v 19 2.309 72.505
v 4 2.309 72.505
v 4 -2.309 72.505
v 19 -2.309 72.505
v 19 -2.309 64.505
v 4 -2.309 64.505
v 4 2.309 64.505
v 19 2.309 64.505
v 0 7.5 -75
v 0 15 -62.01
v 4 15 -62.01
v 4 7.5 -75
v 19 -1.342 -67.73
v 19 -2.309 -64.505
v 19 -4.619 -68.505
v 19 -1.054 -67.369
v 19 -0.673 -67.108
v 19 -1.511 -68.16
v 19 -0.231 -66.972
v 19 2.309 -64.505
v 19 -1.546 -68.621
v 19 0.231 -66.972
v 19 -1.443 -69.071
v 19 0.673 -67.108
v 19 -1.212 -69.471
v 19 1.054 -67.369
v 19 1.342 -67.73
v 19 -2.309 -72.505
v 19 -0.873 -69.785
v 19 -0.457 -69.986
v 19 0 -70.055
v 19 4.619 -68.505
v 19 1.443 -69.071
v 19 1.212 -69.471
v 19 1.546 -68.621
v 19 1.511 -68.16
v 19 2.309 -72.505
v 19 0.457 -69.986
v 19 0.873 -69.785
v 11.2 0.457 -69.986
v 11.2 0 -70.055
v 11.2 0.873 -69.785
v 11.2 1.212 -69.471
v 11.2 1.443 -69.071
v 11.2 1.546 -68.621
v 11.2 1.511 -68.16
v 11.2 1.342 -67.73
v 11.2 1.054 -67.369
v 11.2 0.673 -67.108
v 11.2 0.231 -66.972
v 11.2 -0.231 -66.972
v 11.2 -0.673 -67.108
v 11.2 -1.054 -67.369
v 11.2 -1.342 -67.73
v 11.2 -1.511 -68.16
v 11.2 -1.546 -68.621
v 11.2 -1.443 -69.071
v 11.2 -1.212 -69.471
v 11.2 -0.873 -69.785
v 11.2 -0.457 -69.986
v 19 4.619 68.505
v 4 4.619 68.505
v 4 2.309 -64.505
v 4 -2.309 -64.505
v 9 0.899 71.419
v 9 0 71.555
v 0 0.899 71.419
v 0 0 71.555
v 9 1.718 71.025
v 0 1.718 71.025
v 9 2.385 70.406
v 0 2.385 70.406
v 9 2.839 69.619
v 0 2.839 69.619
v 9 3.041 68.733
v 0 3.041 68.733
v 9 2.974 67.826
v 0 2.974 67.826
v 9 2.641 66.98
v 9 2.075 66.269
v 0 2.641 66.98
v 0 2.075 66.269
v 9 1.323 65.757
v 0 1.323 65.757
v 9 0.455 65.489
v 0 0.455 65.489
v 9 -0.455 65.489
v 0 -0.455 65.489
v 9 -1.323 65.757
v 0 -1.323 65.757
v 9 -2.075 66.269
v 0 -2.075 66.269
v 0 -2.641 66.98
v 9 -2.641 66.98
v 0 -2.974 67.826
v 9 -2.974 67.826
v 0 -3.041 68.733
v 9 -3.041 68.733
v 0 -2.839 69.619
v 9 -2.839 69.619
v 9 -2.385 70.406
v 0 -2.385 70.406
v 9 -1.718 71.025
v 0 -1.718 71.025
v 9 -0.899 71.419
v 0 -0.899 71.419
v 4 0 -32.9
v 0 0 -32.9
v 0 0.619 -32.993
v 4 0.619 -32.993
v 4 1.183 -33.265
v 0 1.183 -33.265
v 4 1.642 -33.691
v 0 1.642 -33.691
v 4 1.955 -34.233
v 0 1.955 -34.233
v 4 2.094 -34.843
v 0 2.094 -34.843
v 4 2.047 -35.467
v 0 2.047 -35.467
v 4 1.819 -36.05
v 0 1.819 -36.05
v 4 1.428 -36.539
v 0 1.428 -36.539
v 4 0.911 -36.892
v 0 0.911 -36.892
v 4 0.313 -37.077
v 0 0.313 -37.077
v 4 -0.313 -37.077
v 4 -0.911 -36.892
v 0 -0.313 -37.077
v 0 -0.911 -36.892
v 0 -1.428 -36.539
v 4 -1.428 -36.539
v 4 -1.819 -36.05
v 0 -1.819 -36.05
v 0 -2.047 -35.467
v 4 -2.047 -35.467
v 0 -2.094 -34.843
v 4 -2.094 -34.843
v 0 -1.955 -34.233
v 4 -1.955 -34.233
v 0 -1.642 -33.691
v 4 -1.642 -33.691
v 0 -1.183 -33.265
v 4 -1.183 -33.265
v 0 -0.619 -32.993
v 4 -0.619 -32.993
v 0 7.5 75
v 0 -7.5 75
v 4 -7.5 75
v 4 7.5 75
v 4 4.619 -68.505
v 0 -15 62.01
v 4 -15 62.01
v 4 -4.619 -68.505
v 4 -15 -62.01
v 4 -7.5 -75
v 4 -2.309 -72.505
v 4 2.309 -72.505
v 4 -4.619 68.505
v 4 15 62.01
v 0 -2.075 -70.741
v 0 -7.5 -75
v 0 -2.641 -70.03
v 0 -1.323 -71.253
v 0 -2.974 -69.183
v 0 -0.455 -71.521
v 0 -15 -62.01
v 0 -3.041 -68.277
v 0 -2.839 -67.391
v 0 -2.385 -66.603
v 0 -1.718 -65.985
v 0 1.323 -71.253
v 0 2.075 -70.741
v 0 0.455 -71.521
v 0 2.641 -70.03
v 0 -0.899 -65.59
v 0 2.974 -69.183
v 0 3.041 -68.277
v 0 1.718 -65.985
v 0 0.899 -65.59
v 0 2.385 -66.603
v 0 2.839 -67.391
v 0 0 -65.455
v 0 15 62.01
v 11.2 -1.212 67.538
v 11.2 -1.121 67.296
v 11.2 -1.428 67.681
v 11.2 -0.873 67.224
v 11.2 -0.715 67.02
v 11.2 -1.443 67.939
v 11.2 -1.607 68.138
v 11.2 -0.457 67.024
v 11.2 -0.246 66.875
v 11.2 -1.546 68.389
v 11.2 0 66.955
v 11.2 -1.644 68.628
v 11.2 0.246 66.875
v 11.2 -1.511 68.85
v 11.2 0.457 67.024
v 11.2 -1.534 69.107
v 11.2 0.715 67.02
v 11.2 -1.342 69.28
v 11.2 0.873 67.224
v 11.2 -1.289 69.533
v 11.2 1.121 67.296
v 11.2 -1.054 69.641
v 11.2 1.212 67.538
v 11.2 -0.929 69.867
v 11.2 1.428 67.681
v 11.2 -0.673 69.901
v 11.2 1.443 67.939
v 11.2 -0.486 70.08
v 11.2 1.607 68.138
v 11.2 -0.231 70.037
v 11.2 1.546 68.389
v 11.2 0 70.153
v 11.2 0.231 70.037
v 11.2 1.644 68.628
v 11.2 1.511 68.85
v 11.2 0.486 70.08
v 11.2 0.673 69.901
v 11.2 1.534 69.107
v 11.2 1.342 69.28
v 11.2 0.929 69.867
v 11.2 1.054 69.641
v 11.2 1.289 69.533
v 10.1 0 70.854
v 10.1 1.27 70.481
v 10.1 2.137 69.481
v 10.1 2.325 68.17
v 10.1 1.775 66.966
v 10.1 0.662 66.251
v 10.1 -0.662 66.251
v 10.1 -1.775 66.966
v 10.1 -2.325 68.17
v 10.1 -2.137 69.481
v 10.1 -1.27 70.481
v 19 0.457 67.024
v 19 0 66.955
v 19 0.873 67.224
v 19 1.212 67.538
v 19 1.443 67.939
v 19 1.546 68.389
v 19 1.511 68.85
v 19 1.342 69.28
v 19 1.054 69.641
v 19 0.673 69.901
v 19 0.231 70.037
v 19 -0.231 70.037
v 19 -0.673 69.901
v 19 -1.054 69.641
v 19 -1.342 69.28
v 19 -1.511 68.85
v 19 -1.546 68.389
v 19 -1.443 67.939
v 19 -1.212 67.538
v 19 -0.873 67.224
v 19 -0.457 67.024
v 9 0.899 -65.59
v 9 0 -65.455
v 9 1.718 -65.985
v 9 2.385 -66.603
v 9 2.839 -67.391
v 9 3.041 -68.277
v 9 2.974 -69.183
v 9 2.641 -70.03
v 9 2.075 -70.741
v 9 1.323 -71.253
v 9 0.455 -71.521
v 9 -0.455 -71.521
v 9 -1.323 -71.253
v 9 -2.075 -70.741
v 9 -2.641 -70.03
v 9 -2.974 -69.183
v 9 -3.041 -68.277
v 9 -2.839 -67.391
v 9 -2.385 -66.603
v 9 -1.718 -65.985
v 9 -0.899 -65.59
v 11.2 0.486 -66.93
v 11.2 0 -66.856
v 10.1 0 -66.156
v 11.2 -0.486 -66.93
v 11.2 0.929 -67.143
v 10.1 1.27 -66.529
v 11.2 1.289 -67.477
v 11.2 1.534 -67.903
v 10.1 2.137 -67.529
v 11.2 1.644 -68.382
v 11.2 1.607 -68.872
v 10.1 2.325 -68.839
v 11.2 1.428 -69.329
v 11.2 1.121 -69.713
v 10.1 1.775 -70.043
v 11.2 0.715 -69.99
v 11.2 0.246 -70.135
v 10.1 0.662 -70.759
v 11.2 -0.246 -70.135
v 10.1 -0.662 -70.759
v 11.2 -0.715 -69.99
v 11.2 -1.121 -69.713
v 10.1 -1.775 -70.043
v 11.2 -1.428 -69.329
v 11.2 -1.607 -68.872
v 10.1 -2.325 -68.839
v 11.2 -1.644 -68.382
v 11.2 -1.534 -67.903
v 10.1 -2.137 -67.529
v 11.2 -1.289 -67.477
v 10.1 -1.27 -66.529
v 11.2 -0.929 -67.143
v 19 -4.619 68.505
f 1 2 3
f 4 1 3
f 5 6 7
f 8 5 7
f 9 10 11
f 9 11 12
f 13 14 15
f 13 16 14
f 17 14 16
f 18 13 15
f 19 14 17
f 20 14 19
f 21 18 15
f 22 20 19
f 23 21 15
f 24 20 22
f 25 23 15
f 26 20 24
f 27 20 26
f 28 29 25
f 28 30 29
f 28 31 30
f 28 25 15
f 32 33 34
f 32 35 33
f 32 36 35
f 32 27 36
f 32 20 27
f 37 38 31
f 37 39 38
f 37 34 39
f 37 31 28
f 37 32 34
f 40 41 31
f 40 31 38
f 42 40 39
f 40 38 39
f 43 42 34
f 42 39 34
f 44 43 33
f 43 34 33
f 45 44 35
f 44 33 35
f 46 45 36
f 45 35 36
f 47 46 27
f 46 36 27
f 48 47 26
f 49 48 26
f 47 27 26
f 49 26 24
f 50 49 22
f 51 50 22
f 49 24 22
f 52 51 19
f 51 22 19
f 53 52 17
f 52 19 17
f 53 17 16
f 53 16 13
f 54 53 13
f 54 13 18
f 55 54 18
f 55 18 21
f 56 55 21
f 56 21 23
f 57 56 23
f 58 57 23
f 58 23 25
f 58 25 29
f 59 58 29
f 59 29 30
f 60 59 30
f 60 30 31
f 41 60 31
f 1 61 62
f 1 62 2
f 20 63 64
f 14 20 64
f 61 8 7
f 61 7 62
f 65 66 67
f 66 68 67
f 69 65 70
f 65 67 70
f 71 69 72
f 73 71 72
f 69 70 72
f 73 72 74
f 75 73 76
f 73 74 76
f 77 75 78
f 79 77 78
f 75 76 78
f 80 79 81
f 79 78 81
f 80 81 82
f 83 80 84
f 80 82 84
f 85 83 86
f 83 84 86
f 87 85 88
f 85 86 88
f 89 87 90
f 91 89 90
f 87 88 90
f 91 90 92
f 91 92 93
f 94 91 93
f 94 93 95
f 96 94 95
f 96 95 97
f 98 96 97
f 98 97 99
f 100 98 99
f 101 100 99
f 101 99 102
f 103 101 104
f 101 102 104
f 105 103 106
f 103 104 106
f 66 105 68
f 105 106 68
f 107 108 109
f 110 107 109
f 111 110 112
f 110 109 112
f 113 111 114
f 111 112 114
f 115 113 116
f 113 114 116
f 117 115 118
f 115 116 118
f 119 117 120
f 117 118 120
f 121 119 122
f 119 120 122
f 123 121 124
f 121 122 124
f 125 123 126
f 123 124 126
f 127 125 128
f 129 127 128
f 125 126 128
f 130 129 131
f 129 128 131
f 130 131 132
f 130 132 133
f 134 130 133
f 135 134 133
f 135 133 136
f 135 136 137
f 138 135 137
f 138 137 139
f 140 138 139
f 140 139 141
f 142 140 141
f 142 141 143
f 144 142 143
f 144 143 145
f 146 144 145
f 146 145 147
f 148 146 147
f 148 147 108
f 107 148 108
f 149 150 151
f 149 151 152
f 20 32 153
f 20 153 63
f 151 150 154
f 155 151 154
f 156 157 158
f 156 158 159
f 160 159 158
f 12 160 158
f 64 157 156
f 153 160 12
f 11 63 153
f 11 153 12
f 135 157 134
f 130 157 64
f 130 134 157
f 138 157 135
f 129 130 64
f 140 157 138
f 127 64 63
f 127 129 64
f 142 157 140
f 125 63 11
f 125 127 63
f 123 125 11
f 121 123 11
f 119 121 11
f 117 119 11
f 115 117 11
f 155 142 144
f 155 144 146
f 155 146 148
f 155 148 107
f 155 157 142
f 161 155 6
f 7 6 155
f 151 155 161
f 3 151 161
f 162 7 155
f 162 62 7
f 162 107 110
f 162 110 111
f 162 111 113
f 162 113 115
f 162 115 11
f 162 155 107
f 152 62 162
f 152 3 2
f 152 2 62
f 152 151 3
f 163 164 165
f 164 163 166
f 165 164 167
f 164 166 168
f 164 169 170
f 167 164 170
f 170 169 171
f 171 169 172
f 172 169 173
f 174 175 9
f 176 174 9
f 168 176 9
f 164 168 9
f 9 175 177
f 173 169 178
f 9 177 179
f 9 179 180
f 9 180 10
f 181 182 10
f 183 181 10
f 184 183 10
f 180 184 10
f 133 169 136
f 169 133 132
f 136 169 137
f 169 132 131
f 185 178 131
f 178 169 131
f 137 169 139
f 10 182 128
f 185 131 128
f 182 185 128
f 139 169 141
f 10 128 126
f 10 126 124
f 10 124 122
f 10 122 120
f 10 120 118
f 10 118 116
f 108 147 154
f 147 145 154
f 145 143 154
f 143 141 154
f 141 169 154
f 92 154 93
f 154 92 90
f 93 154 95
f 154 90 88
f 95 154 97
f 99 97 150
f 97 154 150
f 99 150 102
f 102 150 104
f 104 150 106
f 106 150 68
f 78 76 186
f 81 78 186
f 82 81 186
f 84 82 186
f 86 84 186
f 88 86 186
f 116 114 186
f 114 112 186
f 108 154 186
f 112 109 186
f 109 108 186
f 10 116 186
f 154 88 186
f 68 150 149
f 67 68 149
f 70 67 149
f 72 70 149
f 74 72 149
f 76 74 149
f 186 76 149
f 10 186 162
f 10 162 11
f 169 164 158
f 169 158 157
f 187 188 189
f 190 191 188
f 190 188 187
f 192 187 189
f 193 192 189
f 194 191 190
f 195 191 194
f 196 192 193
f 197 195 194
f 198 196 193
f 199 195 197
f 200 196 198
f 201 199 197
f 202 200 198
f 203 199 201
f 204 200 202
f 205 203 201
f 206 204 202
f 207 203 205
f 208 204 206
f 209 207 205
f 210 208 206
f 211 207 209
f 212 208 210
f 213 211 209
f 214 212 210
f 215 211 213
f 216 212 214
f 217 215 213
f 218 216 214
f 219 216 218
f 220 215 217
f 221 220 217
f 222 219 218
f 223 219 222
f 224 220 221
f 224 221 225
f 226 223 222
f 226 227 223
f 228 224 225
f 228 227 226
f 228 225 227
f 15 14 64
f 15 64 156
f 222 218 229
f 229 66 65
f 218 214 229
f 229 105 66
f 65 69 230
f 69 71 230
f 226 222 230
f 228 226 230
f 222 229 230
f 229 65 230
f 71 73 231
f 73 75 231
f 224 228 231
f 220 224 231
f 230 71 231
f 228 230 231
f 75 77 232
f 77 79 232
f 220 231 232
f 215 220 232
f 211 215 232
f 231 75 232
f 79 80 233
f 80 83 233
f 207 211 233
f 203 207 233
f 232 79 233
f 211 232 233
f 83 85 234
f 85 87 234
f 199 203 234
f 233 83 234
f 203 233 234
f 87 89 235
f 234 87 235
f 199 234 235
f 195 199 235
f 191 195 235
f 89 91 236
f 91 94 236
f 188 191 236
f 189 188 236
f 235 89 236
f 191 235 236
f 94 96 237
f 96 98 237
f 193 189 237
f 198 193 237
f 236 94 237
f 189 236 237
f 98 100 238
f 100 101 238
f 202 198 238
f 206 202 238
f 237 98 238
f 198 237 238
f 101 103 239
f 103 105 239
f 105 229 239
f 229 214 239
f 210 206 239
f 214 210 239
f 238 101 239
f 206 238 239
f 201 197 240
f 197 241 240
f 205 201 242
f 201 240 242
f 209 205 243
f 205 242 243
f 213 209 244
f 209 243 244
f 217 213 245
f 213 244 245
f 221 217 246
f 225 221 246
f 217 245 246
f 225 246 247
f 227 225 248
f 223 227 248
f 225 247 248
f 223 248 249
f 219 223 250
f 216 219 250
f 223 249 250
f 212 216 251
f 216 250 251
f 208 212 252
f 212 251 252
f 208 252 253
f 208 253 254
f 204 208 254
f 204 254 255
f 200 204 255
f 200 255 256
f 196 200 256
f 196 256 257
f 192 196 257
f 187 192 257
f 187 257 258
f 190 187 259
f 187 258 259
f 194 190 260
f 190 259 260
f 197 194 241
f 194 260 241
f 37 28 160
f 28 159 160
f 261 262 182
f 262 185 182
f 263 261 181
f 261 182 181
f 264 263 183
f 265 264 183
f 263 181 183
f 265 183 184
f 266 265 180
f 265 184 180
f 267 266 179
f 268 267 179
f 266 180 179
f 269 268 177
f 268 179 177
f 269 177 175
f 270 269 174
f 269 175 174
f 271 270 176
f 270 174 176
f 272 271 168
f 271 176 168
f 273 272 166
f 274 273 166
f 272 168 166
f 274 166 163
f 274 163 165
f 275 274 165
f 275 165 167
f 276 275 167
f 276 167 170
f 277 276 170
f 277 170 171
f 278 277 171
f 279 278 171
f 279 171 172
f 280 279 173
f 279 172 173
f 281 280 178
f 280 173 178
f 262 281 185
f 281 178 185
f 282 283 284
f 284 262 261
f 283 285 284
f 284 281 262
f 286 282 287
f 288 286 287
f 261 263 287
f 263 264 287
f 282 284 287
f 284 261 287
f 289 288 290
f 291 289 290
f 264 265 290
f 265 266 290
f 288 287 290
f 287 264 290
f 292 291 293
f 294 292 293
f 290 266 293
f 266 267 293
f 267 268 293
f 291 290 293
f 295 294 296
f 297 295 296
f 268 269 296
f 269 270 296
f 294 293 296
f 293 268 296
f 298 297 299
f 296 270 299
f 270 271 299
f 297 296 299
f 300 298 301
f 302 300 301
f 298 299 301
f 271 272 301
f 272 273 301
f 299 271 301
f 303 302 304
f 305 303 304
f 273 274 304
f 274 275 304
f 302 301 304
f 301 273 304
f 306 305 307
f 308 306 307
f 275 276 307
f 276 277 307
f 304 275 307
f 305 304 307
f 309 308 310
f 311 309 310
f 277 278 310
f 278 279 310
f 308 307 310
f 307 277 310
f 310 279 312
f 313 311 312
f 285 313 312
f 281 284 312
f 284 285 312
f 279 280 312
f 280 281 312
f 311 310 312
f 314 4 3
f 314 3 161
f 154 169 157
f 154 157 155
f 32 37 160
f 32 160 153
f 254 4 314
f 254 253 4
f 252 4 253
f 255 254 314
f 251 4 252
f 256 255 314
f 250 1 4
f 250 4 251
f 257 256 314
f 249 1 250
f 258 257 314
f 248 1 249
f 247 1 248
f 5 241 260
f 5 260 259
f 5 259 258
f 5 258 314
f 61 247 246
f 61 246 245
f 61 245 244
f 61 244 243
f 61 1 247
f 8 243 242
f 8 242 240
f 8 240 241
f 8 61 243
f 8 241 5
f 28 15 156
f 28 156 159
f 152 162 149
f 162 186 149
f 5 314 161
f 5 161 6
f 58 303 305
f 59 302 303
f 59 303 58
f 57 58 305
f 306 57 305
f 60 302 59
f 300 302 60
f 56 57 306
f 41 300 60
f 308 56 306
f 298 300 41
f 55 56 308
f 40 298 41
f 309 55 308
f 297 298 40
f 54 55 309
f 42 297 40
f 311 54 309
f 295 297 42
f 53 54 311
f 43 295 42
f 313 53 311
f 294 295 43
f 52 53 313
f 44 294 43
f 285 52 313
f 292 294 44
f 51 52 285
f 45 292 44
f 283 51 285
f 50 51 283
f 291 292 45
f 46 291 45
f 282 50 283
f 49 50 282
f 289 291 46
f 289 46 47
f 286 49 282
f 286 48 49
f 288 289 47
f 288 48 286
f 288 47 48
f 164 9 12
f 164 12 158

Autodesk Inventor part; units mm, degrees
ref_plane "YZ Plane" through (0, 0, 0) normal (1, 0, 0) x (0, 1, 0)
ref_plane "XZ Plane" through (0, 0, 0) normal (0, 1, 0) x (-1, 0, 0)
sketch "Sketch1" plane through (0, 0, 0) normal (1, 0, 0) x (0, 1, 0)
  line L0 (-15, 75) -> (15, 75)
  line L1 (15, 75) -> (15, -75)
  line L2 (15, -75) -> (-15, -75)
  line L3 (-15, -75) -> (-15, 75)
  line L4 (-15, 75) -> (15, -75) construction
  line L5 (15, 75) -> (-15, -75) construction
  line L6 (15, 64.89637) -> (15, 43.985813)
  line L7 (-15, 43.985813) -> (-15, 64.193072)
  line L8 (-21, 0) -> (21, 0)
  line L9 (0, -105) -> (0, 105)
  line L10 (-15, -62.009619) -> (-7.5, -49.019238)
  line L11 (-7.5, -49.019238) -> (7.5, -49.019238)
  line L12 (7.5, -49.019238) -> (15, -62.009619)
  line L13 (15, -62.009619) -> (7.5, -75)
  line L14 (7.5, -75) -> (-7.5, -75)
  line L15 (-7.5, -75) -> (-15, -62.009619)
  line L16 (15, 62.009619) -> (7.5, 75)
  line L17 (-7.5, 75) -> (-15, 62.009619)
  point P0 (0, 0)
  point P1 (0, -62.009619)
  point P2 (-7.5, -75)
  point P3 (7.5, -75)
  point P4 (15, -62.009619)
  point P5 (15, 62.009619)
  point P6 (7.5, 75)
  point P7 (-7.5, 75)
  point P8 (-15, 62.009619)
  dimension "d0" = 30
  dimension "d1" = 150
extrude "Extrusion1" add sketch "Sketch1" along normal blind 4 contours L0 L9 L8 L3 L17 | L0 L16 L1 L8 L9 | L9 L11 L10 L3 L8 | L8 L1 L12 L11 L9 | L11 L12 L13 L2 L9 | L9 L2 L15 L10 L11
sketch "Sketch2" plane through (4, 0, 0) normal (1, 0, 0) x (0, 0, -1)
  line L0 (62.009619, 15) -> (-62.009619, 15)
  line L1 (62.009619, 15) -> (-62.009619, 15)
  line L2 (-62.009619, -15) -> (62.009619, -15)
  line L3 (-105, 0) -> (105, 0)
  line L4 (0, -21) -> (0, 21)
  line L5 (-68.504809, 4.618802) -> (-64.504809, 2.309401)
  line L6 (-64.504809, 2.309401) -> (-64.504809, -2.309401)
  line L7 (-64.504809, -2.309401) -> (-68.504809, -4.618802)
  line L8 (-68.504809, -4.618802) -> (-72.504809, -2.309401)
  line L9 (-72.504809, -2.309401) -> (-72.504809, 2.309401)
  line L10 (-72.504809, 2.309401) -> (-68.504809, 4.618802)
  line L11 (68.504809, 4.618802) -> (64.504809, 2.309401)
  line L12 (64.504809, 2.309401) -> (64.504809, -2.309401)
  line L13 (64.504809, -2.309401) -> (68.504809, -4.618802)
  line L14 (68.504809, -4.618802) -> (72.504809, -2.309401)
  line L15 (72.504809, -2.309401) -> (72.504809, 2.309401)
  line L16 (72.504809, 2.309401) -> (68.504809, 4.618802)
  line L17 (-75, 7.5) -> (-75, -7.5)
  line L18 (-62.009619, -15) -> (62.009619, -15)
  line L19 (-62.009619, 15) -> (-62.009619, -15)
  line L20 (-75, 7.5) -> (-75, -7.5)
  line L21 (-75, 0) -> (-62.009619, 0)
  point P0 (0, 0)
  point P1 (68.504809, 0)
  point P2 (-68.504809, 0)
  dimension "d8" = 8
sketch "Sketch2 outline for Extrusion3" plane through (4, 0, 0) normal (1, 0, 0) x (0, 0, -1)
  line L0 (68.504809, -4.618802) -> (72.504809, -2.309401)
  line L1 (64.504809, -2.309401) -> (68.504809, -4.618802)
  line L2 (64.504809, 2.309401) -> (64.504809, -2.309401)
  line L3 (68.504809, 4.618802) -> (64.504809, 2.309401)
  line L4 (72.504809, 2.309401) -> (68.504809, 4.618802)
  line L5 (72.504809, -2.309401) -> (72.504809, 2.309401)
  line L6 (-64.504809, 2.309401) -> (-68.504809, 4.618802)
  line L7 (-64.504809, -2.309401) -> (-64.504809, 2.309401)
  line L8 (-68.504809, -4.618802) -> (-64.504809, -2.309401)
  line L9 (-72.504809, -2.309401) -> (-68.504809, -4.618802)
  line L10 (-72.504809, 2.309401) -> (-72.504809, -2.309401)
  line L11 (-68.504809, 4.618802) -> (-72.504809, 2.309401)
extrude "Extrusion3" add sketch "Sketch2 outline for Extrusion3" along normal blind 15
sketch "Sketch3" plane through (19, 0, 0) normal (1, 0, 0) x (0, 0, -1)
  line L0 (-64.504809, 2.309401) -> (-68.504809, 4.618802)
  line L1 (-68.504809, -4.618802) -> (-64.504809, -2.309401)
  line L2 (-64.504809, -2.309401) -> (-64.504809, 2.309401)
  line L3 (-64.504809, -2.309401) -> (-68.504809, -4.618802)
  circle A0 centre (-68.504809, 0) radius 1.55
  line L4 (0, -21) -> (0, 21)
  circle A1 centre (68.504809, 0) radius 1.55
  line L5 (-68.504809, 4.618802) -> (-68.504809, -4.618802)
  point P0 (0, 0)
  dimension "d12" = 3.1
extrude "Extrusion4" cut sketch "Sketch3" against normal through all contours L5 A0 | A0 L5 | A1
ref_plane "Work Plane1" through (9, 0, 0) normal (1, 0, 0) x (0, 0, -1)
sketch "Sketch4" plane through (9, 0, 0) normal (-1, 0, 0) x (0, 0, 1)
  circle A0 centre (-68.504809, 0) radius 1.55
  circle A1 centre (68.504809, 0) radius 1.55
  circle A2 centre (-68.504809, 0) radius 3.05
  circle A3 centre (68.504809, 0) radius 3.05
  point P0 (0, 0)
  dimension "d15" = 6.1
sketch "Sketch4 outline for Extrusion5" plane through (9, 0, 0) normal (-1, 0, 0) x (0, 0, 1)
  circle A0 centre (68.504809, 0) radius 3.05
  circle A1 centre (-68.504809, 0) radius 3.05
extrude "Extrusion5" cut sketch "Sketch4 outline for Extrusion5" against normal blind 2.2 draft -32.5
sketch "Sketch5" plane through (0, 0, 0) normal (-1, 0, 0) x (0, 0, 1)
  circle A0 centre (-68.504809, 0) radius 3.05
  circle A1 centre (68.504809, 0) radius 3.05
  point P0 (0, 0)
extrude "Extrusion6" cut sketch "Sketch5" against normal up to surface (9 mm away)
sketch "Sketch8" plane through (0, 0, 0) normal (-1, 0, 0) x (0, 0, 1)
  circle A0 centre (-35, 0) radius 2.1
  line L0 (-75, -7.5) -> (-75, 7.5) projected
  line L1 (0, -21) -> (0, 21) projected
  line L2 (75, 7.5) -> (75, -7.5) projected
  line L3 (-105, 0) -> (105, 0) projected
  point P0 (0, 0)
  dimension "d26" = 40
  dimension "d27" = 4.2
extrude "Extrusion7" cut sketch "Sketch8" against normal through all
equation "\"d0\" = BodyHeight"
equation "\"d1\" = BodyLength"
equation "\"d2\" = SideThickness"
equation "\"d8\" = M3ScrewInsertBrim"
equation "\"d9\" = WheeGuardlSlotWidth"
equation "\"d12\" = M3ScrewDia"
equation "\"d15\" = M3ScrewHeadDia"
equation "\"d16\" = M3ScrewHeadDepth"
equation "\"d17\" = M3ScrewHeadTaper"
equation "\"d26\" = DriveMotorOffset"
equation "\"d27\" = DriveMotorHoleDia"
equation "\"BodyHeight\" = 30"
equation "\"BodyLength\" = 150"
equation "\"SideThickness\" = 4"
equation "\"M3ScrewInsertBrim\" = 8"
equation "\"WheeGuardlSlotWidth\" = 15"
equation "\"M3ScrewDia\" = 3.1"
equation "\"M3ScrewHeadDia\" = 6.1"
equation "\"M3ScrewHeadDepth\" = 2.2"
equation "\"M3ScrewHeadTaper\" = -32.5deg"
equation "\"DriveMotorOffset\" = 40"
equation "\"DriveMotorHoleDia\" = 4.2"
properties part number "HexWheelGuard" material "H TPU"
